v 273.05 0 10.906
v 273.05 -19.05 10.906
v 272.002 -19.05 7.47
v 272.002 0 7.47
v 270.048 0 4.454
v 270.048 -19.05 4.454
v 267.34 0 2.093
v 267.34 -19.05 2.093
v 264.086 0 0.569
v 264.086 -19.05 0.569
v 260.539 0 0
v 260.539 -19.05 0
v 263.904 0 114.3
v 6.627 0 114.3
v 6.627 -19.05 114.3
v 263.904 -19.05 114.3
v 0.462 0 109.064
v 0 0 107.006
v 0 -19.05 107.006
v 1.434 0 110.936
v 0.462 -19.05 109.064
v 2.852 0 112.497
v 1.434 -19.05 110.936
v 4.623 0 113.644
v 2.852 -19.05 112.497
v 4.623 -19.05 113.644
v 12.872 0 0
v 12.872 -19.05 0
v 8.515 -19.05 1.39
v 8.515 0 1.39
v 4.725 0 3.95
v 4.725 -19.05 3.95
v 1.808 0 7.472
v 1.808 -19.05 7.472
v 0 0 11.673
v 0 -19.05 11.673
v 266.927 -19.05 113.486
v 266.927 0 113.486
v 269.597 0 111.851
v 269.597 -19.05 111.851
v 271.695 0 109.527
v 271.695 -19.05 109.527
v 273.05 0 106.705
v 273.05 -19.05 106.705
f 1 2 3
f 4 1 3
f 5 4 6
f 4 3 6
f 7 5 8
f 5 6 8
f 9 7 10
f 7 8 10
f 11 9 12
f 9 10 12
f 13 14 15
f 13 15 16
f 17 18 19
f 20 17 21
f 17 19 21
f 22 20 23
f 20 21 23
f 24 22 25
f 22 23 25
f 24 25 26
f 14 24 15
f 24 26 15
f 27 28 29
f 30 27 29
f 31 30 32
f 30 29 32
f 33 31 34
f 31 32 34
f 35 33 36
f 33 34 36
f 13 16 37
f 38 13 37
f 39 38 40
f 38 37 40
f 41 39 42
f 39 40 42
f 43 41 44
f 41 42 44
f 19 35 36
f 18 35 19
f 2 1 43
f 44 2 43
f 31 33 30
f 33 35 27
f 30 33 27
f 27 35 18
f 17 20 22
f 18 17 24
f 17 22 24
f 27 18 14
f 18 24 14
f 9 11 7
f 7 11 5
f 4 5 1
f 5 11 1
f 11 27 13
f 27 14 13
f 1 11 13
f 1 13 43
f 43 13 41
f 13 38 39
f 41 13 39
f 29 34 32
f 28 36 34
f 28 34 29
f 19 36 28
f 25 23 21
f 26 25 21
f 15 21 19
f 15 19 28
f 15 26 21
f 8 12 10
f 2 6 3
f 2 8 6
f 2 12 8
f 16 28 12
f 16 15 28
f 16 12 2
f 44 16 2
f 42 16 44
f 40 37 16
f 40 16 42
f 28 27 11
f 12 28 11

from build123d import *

# Parameters (mm, degrees)
F0_W     = 273.05
F0_H     = 114.3
F1_DEPTH = 19.05
F3_DEPTH = 25.4


with BuildPart() as f1:
    # F0 (on Front) → F1 (new body)
    with BuildSketch(Plane.XZ):
        with Locations((136.525, 57.15)):
            Rectangle(F0_W, F0_H)
    extrude(amount=F1_DEPTH)

    # F2 (on face) → F3 (cut)
    with BuildSketch(Plane.XZ.offset(19.05)):
        with BuildLine():
            ThreePointArc((0, 107.0055749257), (2.092673074, 111.7621294614), (6.6273510973, 114.3))
            Line((6.6273510973, 114.3), (0, 114.3))
            Line((0, 114.3), (0, 107.0055749257))
        make_face()
        with BuildLine():
            ThreePointArc((12.8718363121, 0), (4.7249016701, 3.9496408033), (0, 11.6728208959))
            Line((0, 11.6728208959), (0, 0))
            Line((0, 0), (12.8718363121, 0))
        make_face()
        with BuildLine():
            Line((273.05, 0), (273.05, 10.9064355493))
            ThreePointArc((273.05, 10.9064355493), (268.7766741331, 3.1791445557), (260.5386294647, 0))
            Line((260.5386294647, 0), (273.05, 0))
        make_face()
        with BuildLine():
            Line((273.05, 114.3), (263.9037072659, 114.3))
            ThreePointArc((263.9037072659, 114.3), (269.5968279196, 111.850995511), (273.05, 106.7046523094))
            Line((273.05, 106.7046523094), (273.05, 114.3))
        make_face()
    extrude(amount=-F3_DEPTH, mode=Mode.SUBTRACT)


solid = f1.part
